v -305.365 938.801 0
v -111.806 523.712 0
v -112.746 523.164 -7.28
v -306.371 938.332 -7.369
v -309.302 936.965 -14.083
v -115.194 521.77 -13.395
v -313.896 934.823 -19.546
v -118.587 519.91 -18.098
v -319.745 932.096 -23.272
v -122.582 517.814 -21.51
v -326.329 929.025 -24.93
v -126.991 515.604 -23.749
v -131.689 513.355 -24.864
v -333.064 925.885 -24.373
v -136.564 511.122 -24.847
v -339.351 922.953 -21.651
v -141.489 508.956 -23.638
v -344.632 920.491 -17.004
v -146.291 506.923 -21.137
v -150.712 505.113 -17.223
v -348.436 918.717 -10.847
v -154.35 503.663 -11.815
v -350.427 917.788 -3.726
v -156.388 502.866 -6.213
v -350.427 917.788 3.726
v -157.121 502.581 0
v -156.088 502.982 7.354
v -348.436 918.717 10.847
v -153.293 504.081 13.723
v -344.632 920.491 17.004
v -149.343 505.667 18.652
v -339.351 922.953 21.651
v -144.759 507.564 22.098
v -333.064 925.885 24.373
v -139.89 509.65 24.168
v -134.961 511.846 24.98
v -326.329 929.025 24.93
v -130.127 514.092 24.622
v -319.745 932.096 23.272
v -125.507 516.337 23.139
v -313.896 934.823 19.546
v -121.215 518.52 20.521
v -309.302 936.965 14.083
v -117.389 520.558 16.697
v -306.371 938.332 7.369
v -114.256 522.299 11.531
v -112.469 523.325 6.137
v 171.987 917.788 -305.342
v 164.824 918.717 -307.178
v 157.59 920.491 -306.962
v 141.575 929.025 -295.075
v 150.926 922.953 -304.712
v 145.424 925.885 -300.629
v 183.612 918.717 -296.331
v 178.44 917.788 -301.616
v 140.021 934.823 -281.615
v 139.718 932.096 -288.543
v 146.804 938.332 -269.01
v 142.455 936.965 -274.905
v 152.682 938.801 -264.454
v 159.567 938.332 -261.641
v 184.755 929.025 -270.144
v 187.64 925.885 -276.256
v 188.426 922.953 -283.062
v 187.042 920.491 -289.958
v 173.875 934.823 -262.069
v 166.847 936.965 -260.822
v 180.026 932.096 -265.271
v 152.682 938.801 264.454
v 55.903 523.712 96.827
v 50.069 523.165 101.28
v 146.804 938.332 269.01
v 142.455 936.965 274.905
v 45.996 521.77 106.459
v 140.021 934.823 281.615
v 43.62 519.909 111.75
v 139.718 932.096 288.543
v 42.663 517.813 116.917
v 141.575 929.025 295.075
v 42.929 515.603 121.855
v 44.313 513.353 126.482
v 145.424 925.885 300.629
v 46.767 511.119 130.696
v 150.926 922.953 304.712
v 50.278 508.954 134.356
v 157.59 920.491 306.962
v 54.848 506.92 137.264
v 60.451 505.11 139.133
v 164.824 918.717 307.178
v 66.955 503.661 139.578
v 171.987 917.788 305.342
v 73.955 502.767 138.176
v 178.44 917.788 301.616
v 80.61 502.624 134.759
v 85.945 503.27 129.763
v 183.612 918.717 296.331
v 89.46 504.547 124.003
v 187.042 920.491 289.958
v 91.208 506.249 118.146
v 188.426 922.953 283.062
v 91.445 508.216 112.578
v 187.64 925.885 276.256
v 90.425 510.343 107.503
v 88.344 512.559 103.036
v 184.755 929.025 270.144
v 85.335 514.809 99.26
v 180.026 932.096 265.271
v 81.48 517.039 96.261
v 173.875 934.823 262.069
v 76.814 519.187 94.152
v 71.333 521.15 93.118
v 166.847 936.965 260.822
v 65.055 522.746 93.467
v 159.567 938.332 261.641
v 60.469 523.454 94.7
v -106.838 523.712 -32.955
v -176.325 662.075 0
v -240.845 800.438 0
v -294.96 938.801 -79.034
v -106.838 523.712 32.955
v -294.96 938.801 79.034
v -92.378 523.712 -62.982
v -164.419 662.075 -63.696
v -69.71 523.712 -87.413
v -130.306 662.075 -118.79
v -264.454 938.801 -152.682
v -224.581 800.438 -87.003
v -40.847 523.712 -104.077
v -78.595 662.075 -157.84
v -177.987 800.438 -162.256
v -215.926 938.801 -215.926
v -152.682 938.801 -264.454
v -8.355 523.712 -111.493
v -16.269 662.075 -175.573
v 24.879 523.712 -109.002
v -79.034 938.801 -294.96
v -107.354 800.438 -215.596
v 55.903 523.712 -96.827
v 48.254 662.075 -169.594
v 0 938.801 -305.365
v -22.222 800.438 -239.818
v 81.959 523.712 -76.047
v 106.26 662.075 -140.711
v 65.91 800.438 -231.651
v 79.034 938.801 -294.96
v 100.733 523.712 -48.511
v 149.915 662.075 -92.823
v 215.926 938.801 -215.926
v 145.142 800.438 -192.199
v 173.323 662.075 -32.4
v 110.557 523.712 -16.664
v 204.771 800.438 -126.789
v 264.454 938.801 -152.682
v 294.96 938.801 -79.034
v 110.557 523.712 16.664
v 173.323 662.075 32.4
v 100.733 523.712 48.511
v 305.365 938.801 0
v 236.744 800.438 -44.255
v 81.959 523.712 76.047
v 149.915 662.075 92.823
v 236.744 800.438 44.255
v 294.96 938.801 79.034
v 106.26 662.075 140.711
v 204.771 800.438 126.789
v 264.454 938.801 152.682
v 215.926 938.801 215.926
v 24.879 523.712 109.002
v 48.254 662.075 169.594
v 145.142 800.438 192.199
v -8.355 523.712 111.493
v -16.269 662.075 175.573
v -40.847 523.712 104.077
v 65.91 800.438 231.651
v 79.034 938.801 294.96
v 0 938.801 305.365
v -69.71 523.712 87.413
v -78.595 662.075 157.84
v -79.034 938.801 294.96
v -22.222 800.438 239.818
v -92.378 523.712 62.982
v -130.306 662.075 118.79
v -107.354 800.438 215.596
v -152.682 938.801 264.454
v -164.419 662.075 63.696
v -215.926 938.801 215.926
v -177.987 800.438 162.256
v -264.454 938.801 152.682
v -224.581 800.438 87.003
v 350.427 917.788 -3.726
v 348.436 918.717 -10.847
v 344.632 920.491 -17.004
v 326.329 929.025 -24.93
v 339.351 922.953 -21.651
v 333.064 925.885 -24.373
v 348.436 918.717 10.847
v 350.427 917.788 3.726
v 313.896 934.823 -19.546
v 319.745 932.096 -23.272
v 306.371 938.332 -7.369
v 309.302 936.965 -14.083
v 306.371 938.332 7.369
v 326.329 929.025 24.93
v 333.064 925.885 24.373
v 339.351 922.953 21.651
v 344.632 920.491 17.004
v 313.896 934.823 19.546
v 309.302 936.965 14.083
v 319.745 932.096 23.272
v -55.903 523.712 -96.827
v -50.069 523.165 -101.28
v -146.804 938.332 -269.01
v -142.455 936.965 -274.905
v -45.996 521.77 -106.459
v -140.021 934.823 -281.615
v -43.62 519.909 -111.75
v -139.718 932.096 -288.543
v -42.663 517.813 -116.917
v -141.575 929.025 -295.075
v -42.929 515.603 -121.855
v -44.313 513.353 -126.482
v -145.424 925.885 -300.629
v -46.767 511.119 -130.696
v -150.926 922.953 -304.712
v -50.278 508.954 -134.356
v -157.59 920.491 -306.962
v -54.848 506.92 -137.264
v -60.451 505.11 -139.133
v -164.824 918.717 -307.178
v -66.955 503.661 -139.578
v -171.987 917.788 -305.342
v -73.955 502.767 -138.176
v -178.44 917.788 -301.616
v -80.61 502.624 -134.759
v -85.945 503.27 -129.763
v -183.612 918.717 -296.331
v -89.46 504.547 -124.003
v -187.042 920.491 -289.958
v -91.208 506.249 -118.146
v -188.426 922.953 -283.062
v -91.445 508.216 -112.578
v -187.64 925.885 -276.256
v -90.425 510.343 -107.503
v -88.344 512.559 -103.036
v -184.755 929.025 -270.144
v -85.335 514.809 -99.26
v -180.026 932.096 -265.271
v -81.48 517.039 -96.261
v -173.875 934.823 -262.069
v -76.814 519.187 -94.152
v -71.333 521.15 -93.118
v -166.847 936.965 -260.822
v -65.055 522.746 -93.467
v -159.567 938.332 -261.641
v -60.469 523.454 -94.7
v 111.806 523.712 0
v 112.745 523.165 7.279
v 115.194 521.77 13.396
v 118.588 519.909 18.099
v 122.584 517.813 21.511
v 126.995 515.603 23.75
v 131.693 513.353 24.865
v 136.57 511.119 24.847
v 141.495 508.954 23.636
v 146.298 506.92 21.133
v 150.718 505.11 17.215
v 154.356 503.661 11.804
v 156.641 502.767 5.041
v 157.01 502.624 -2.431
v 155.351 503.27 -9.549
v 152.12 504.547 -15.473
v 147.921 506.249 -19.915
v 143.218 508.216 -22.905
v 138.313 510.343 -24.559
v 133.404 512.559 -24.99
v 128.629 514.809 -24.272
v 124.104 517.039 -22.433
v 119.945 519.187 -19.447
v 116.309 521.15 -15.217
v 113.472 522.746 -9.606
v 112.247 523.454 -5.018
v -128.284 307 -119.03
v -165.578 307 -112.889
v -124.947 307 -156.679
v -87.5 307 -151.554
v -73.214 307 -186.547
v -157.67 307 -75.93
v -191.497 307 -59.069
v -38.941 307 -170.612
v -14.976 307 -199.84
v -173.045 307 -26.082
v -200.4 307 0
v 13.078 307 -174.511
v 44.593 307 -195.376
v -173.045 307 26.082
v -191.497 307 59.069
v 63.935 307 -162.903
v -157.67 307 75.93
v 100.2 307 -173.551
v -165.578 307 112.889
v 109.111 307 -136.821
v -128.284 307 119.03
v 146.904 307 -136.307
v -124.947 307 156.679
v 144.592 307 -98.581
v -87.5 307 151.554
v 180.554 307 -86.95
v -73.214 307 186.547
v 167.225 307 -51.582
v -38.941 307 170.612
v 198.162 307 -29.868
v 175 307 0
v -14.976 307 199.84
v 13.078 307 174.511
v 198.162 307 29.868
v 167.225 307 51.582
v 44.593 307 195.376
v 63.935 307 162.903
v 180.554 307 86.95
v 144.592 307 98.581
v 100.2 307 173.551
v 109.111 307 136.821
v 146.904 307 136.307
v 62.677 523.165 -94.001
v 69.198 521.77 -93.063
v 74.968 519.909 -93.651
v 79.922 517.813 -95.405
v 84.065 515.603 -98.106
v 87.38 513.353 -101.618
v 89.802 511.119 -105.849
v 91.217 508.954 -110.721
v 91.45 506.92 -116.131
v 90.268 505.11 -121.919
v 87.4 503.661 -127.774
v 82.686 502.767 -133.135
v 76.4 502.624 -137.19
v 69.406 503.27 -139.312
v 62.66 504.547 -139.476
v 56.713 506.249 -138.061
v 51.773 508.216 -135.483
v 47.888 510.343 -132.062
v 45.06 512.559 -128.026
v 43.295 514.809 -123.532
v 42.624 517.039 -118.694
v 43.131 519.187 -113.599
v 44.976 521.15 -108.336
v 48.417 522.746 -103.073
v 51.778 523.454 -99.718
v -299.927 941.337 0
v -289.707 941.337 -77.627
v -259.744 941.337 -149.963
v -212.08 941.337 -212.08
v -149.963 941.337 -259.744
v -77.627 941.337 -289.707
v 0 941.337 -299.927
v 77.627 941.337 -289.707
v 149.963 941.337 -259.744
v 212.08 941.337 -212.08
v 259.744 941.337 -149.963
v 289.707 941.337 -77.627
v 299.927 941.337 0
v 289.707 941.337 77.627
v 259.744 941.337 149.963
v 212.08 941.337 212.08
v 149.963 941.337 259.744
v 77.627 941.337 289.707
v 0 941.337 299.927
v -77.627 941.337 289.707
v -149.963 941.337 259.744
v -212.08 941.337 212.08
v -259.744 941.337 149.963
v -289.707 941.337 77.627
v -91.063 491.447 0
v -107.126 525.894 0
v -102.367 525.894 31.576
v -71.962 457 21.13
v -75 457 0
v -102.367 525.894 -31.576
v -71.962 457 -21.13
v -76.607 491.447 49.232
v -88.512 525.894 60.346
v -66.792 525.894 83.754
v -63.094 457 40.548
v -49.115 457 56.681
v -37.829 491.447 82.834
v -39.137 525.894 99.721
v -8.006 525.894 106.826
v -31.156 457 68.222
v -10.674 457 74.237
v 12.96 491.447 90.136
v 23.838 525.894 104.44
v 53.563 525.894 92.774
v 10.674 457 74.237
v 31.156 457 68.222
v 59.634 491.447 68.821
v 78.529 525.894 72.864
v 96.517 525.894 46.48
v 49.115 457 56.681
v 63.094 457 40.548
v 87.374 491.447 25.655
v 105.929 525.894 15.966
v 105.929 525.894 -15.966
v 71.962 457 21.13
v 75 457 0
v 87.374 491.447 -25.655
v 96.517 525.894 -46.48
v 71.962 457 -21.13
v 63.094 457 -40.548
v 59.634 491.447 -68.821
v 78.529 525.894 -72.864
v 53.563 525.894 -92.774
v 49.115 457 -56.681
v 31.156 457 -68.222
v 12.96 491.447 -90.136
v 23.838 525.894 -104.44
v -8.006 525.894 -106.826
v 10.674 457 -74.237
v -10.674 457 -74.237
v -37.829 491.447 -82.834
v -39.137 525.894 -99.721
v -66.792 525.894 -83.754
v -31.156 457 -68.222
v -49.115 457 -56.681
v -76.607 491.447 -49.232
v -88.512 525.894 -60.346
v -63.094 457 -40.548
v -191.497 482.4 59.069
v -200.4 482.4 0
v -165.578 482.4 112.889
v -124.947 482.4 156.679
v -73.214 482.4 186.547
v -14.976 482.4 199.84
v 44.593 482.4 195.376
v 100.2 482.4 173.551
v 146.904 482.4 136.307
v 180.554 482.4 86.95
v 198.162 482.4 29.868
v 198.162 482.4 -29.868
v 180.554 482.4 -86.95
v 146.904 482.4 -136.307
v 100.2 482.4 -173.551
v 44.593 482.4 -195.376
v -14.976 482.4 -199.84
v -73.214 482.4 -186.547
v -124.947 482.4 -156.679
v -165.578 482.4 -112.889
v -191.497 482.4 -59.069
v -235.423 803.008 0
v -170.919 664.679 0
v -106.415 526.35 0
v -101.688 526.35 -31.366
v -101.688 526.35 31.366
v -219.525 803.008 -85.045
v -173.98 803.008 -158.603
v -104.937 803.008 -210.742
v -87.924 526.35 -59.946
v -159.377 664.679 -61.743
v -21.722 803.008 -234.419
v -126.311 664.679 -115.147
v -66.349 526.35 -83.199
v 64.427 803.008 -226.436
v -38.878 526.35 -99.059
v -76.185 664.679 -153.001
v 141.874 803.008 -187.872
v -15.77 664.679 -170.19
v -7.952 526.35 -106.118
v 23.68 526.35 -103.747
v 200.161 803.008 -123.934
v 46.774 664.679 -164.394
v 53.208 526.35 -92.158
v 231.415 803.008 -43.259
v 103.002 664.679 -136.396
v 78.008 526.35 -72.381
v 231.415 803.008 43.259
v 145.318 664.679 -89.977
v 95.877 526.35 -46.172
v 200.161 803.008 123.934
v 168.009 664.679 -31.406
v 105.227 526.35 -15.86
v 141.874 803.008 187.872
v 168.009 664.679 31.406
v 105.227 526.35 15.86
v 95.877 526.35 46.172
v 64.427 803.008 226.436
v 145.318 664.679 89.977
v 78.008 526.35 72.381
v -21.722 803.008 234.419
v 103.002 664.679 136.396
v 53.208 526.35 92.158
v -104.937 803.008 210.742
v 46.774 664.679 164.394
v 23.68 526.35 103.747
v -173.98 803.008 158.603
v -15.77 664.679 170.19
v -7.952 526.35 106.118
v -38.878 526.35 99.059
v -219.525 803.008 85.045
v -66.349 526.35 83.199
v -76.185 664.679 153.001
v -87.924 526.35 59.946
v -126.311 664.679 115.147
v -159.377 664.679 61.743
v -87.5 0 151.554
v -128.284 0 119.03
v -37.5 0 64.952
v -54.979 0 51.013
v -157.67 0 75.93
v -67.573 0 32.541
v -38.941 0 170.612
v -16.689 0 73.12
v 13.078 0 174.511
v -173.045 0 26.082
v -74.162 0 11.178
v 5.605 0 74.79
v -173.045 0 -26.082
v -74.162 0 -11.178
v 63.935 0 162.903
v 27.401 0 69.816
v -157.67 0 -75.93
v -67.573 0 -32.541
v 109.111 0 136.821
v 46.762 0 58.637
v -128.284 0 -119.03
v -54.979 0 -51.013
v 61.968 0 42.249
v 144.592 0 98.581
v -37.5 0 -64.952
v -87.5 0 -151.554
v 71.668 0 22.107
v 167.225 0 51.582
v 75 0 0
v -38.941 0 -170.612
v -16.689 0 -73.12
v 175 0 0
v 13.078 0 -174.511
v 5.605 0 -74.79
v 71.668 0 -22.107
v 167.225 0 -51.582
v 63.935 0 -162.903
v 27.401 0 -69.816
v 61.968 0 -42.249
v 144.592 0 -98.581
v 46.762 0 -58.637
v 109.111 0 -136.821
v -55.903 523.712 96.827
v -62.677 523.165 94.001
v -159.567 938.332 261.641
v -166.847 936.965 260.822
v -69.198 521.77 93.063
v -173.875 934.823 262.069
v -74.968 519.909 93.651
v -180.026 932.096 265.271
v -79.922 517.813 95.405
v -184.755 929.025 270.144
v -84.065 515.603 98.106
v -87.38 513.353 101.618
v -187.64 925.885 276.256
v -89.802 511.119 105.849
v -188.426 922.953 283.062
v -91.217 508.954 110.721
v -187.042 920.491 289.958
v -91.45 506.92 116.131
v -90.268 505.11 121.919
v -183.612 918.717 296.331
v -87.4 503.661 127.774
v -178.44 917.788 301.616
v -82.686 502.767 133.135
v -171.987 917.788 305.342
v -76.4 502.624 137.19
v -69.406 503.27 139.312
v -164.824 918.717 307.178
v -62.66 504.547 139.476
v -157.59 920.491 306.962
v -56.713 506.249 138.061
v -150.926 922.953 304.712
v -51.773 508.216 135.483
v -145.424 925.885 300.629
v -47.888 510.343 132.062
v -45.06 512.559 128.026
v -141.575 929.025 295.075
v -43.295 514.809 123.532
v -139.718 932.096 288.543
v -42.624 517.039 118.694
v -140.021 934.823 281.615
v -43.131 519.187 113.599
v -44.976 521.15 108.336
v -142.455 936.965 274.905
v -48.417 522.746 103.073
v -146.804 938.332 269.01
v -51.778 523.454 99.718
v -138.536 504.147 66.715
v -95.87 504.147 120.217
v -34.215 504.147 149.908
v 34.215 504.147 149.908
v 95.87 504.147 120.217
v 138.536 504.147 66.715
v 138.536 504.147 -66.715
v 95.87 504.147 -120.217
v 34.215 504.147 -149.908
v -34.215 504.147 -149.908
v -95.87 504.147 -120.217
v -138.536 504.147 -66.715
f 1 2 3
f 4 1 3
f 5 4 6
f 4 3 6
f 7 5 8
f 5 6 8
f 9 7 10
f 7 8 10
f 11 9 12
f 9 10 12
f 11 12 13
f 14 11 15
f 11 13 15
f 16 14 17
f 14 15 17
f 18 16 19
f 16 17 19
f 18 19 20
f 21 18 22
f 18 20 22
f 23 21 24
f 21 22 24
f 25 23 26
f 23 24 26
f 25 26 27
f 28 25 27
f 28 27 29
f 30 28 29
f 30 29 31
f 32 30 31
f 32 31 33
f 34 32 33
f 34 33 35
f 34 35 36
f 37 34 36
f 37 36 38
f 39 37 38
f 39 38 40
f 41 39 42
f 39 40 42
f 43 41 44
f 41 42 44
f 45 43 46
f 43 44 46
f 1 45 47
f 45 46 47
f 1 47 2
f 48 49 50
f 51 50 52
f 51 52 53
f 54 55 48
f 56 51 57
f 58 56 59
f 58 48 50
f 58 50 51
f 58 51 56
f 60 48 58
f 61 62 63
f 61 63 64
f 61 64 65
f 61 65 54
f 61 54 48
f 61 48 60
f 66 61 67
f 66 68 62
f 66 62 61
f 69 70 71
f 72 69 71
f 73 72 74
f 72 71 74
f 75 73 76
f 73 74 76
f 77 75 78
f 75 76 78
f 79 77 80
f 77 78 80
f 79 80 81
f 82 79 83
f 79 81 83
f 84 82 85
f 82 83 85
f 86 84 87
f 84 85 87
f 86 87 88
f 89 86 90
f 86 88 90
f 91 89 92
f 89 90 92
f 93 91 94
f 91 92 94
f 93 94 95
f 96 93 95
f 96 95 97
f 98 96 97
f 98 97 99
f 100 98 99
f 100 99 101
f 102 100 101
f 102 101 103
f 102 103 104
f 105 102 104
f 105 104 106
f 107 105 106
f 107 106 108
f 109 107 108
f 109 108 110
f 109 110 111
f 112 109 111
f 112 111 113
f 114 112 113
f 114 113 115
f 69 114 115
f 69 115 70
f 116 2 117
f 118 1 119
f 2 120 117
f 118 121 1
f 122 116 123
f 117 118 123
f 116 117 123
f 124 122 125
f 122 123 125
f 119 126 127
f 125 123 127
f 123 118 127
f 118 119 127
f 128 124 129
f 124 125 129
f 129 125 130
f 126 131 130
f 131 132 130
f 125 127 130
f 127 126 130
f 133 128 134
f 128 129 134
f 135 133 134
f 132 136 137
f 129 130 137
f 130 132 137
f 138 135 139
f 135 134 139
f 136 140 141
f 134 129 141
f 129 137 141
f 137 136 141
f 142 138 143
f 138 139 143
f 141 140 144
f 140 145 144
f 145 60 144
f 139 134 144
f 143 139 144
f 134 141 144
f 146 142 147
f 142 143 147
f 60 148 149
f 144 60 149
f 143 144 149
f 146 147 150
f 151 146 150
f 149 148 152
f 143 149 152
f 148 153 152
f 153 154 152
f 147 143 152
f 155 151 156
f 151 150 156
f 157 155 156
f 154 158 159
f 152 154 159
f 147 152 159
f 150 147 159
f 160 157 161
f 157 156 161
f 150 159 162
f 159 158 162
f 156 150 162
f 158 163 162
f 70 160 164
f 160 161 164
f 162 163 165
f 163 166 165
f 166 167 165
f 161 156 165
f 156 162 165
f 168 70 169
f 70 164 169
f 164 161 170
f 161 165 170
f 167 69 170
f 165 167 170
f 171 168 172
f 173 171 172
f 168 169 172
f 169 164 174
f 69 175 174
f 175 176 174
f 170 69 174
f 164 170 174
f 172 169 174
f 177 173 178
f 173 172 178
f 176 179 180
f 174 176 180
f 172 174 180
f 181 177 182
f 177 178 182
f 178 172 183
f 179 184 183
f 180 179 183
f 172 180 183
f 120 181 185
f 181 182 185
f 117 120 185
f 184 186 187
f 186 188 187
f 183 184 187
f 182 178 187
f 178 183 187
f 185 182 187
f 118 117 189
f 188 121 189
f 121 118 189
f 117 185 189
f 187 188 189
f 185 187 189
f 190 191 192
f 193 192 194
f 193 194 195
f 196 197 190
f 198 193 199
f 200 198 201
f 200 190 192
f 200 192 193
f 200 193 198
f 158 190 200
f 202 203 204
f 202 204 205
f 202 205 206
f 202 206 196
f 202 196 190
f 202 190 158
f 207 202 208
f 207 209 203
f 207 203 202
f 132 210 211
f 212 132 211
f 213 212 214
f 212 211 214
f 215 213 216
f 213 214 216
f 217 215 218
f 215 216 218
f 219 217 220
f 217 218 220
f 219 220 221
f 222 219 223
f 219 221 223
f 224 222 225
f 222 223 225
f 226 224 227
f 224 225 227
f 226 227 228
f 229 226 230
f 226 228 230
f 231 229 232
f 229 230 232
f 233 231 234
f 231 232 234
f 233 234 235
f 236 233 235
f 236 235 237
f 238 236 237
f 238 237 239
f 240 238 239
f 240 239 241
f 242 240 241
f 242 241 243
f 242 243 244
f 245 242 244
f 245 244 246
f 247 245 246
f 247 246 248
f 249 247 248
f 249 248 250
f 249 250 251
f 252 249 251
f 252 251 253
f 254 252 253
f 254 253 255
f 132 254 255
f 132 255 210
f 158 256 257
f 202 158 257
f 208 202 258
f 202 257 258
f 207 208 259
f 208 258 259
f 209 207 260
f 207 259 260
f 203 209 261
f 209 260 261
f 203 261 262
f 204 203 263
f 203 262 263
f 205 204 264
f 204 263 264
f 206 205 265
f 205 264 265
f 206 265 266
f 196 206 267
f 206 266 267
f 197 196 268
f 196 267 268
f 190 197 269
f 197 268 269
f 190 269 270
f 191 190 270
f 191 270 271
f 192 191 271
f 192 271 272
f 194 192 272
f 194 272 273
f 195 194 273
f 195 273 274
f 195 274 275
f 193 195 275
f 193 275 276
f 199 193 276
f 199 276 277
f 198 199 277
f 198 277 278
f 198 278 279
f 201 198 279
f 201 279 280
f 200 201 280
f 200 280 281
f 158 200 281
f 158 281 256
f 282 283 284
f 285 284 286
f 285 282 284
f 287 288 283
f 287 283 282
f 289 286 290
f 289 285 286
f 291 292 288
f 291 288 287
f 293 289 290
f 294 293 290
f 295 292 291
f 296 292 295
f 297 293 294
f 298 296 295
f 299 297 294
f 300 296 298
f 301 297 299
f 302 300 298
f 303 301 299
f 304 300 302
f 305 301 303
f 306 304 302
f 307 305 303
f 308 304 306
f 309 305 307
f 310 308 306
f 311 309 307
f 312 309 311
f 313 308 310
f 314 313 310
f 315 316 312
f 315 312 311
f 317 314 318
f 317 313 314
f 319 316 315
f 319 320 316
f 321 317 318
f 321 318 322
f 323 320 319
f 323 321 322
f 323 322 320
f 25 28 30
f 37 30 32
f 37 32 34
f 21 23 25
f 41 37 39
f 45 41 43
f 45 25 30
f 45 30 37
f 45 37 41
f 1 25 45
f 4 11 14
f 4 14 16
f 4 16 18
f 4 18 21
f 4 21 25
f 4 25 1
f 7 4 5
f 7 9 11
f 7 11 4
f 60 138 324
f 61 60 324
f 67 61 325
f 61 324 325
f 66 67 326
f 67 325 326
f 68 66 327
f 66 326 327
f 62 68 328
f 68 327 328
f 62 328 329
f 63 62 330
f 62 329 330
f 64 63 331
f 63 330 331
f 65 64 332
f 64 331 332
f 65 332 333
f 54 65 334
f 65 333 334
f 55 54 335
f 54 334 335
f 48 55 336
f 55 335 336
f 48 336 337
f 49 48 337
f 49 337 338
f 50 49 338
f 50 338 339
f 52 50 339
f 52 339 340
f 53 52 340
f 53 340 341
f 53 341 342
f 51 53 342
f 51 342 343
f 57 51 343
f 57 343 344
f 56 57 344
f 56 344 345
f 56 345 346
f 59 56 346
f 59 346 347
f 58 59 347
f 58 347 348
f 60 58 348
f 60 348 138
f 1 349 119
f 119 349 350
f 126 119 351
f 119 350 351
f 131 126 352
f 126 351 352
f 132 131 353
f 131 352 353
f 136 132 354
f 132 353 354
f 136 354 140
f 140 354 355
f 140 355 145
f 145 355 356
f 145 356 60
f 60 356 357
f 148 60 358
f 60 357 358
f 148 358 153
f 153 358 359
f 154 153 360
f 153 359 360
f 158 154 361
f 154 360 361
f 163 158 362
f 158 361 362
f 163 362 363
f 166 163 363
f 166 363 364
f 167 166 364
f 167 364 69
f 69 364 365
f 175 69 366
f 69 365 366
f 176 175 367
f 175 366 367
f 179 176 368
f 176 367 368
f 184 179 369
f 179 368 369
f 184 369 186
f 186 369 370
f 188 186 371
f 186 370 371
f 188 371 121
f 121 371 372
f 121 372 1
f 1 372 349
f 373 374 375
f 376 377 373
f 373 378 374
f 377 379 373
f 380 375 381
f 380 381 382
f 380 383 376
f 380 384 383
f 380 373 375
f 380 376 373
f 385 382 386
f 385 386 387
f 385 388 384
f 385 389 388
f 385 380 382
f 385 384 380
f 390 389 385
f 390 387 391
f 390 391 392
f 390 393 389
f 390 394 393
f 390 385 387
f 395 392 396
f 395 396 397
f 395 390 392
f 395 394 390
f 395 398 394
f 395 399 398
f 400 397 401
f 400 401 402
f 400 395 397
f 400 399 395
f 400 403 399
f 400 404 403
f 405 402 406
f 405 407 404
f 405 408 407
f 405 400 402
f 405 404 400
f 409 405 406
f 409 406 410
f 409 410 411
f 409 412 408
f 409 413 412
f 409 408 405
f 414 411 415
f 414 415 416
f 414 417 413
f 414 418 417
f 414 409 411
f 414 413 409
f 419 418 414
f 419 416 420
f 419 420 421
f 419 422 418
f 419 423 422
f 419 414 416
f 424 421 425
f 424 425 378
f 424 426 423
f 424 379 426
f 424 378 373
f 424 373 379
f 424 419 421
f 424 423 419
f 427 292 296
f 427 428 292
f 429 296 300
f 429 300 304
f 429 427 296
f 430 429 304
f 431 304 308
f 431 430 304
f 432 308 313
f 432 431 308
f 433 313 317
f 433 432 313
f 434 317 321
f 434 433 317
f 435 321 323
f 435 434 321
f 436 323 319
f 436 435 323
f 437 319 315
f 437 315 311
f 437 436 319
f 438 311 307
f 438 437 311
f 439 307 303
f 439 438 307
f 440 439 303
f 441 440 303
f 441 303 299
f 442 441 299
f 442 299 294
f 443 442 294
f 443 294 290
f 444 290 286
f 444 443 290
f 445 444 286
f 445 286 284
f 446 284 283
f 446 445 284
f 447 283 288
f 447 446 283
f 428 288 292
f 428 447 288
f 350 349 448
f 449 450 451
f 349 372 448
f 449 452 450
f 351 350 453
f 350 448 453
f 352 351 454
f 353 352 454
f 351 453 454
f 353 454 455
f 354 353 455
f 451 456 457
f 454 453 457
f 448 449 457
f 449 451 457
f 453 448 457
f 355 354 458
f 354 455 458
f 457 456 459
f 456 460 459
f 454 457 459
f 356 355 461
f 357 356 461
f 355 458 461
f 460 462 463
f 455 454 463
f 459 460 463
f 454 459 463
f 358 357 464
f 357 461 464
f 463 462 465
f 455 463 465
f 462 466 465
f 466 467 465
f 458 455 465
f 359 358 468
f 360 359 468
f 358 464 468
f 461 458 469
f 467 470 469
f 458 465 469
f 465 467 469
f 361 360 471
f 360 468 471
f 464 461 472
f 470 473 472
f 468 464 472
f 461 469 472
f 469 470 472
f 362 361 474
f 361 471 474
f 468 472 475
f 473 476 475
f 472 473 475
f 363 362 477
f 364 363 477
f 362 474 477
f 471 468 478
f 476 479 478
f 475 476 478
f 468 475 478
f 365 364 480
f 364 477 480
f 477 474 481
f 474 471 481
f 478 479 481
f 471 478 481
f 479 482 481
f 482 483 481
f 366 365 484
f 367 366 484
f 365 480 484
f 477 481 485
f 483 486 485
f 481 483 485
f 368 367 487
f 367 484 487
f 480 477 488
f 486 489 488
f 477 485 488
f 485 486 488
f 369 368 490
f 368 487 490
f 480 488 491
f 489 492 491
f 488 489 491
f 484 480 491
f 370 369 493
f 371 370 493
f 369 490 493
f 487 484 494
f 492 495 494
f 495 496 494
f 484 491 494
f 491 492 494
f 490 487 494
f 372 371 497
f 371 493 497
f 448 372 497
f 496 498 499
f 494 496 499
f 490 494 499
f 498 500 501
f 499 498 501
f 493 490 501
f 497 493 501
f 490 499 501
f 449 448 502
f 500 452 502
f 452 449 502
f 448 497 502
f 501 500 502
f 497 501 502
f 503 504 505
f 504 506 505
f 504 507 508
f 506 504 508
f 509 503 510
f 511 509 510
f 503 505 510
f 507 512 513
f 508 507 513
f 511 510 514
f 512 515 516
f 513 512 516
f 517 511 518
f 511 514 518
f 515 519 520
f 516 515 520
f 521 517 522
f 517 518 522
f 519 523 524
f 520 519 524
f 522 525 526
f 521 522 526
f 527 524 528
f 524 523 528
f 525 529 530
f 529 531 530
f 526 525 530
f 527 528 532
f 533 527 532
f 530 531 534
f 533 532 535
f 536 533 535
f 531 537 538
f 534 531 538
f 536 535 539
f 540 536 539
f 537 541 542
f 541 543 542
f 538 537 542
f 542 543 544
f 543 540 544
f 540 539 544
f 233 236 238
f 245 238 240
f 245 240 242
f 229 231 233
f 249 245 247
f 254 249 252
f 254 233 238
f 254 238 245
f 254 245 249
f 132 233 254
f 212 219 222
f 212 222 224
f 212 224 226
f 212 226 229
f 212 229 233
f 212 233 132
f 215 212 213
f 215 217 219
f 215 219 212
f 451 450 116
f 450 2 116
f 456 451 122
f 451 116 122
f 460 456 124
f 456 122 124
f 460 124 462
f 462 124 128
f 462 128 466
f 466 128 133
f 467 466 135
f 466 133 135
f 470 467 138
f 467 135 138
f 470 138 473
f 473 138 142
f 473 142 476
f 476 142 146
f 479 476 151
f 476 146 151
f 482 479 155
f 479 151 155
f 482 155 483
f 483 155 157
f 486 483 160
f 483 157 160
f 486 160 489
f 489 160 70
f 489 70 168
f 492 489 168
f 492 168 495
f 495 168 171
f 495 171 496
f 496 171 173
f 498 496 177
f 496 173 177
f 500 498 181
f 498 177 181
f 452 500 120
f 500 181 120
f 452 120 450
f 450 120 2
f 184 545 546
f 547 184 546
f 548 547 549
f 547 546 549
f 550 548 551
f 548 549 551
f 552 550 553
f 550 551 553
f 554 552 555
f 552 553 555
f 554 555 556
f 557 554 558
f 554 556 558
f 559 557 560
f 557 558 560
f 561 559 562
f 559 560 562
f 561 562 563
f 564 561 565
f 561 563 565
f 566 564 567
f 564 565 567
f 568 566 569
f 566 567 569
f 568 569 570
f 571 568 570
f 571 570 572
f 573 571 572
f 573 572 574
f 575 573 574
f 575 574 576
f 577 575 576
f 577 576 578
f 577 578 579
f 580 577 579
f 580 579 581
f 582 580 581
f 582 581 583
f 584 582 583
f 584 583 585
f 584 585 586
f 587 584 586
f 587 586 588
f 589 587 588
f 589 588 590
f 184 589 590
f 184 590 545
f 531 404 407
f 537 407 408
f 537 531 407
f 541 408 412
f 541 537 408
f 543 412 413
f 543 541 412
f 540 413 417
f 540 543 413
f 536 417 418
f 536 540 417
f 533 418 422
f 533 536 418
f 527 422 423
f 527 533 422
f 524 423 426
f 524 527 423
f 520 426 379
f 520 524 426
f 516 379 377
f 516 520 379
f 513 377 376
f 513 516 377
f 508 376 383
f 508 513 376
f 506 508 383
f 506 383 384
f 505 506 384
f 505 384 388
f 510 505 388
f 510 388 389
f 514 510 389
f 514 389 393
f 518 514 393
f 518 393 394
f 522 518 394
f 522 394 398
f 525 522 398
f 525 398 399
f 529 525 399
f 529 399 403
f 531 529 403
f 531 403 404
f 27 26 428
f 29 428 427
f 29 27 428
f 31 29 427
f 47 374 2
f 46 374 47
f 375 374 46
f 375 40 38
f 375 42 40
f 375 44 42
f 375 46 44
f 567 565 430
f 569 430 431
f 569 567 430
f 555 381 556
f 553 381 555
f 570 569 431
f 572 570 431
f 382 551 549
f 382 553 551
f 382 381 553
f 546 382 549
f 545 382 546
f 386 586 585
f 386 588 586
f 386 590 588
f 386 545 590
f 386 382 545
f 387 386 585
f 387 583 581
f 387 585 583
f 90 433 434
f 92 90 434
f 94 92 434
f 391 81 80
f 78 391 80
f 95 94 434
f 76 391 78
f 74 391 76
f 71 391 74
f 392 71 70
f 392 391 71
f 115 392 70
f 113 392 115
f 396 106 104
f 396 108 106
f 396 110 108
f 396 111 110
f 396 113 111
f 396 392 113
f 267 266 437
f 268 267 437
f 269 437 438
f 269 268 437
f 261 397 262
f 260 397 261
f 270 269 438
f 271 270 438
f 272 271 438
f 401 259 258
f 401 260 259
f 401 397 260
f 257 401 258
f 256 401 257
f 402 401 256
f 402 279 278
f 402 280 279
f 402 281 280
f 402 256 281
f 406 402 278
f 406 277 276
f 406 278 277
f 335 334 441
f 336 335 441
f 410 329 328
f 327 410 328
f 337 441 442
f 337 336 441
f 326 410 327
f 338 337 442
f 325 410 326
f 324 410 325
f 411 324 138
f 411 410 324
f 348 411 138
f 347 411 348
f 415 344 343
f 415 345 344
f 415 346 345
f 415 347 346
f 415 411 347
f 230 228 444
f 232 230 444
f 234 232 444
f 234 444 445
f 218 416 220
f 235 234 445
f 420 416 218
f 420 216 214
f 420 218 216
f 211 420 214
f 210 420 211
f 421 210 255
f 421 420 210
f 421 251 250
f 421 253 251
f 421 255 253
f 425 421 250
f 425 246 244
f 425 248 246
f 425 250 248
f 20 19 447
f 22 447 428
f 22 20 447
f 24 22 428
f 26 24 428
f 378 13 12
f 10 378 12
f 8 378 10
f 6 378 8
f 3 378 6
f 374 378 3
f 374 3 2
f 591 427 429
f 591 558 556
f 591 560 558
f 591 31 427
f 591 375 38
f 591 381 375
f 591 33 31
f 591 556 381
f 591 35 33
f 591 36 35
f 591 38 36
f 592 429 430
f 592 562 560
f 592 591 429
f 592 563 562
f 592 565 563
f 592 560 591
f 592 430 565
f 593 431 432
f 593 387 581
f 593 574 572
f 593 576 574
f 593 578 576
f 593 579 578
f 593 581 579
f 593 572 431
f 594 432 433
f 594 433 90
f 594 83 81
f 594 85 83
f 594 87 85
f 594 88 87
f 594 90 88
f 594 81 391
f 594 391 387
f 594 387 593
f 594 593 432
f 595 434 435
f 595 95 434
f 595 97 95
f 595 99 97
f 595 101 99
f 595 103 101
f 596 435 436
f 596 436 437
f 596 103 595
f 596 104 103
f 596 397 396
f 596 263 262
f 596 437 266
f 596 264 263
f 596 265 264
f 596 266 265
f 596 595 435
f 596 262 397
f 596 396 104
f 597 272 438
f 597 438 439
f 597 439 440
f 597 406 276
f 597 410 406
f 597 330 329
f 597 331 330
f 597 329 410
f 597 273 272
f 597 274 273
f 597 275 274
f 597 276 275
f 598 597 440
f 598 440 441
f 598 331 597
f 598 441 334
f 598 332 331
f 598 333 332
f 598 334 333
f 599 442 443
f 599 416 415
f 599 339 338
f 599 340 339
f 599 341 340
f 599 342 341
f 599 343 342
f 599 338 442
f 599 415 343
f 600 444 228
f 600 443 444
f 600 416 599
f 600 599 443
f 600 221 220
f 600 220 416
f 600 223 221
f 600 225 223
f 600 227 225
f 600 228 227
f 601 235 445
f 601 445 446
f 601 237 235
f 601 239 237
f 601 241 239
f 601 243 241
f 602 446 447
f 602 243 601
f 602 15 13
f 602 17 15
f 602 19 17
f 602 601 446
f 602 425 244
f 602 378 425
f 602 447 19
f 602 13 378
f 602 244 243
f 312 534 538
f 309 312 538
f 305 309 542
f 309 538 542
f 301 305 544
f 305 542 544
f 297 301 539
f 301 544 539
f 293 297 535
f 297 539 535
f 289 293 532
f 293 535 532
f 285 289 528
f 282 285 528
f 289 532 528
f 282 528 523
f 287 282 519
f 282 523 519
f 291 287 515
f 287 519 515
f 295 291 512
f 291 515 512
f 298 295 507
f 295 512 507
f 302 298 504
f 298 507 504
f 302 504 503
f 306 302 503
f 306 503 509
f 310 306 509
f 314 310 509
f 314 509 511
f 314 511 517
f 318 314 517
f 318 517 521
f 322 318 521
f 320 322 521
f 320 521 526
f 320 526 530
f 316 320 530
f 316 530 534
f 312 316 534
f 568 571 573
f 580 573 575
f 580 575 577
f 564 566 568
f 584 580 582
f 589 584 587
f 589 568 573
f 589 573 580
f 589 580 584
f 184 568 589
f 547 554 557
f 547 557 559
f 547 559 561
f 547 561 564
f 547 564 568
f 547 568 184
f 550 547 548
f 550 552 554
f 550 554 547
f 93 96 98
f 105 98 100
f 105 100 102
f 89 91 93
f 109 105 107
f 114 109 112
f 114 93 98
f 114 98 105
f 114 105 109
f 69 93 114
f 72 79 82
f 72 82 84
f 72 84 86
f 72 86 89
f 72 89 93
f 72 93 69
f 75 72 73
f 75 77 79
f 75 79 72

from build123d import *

# Parameters (mm, degrees)
SKETCH1_R           = 175
SKETCH1_R_2         = 75
BOSS_EXTRUDE1_DEPTH = 457
SKETCH3_R           = 25
CUT_EXTRUDE1_DEPTH  = 50
CIRPATTERN1_COUNT   = 6
SKETCH4_R           = 25
BOSS_EXTRUDE2_DEPTH = 508
CIRPATTERN2_COUNT   = 6


with BuildPart() as part:
    # Sketch1 → Boss-Extrude1 (new body)
    with BuildSketch(Plane(origin=(0, 0, 0), x_dir=(1, 0, 0), z_dir=(0, 1, 0))):
        Circle(SKETCH1_R)
        Circle(SKETCH1_R_2, mode=Mode.SUBTRACT)
    extrude(amount=BOSS_EXTRUDE1_DEPTH)

    # Sketch2 → Revolve1 (revolve)
    with BuildSketch(Plane.XY):
        Polygon((-175, 307), (-200.4, 307), (-200.4, 482.4), (-107.12583228, 525.894458716), (-75, 457), (-175, 457), align=None)
    revolve(axis=Axis((0, 0, 0), (0, 1, 0)))

    # Sketch3 → Cut-Extrude1 (cut)
    with BuildSketch(Plane(origin=(220.56260119, 472.998024657, 0), x_dir=(0.906307787, -0.422618262, 0), z_dir=(0.422618262, 0.906307787, 0))):
        with Locations((-95, 0)):
            Circle(SKETCH3_R)
    cut_extrude1 = extrude(amount=-CUT_EXTRUDE1_DEPTH, mode=Mode.SUBTRACT)

    # CirPattern1: Cut-Extrude1 ×6 about axis
    cirpattern1_axis = Axis((0, 0, 0), (0, 1, 0))
    for i in range(1, CIRPATTERN1_COUNT):
        add(cut_extrude1.rotate(cirpattern1_axis, i * 360 / CIRPATTERN1_COUNT), mode=Mode.SUBTRACT)

    # Sketch4 → Boss-Extrude2 (add)
    with BuildSketch(Plane(origin=(-199.431688103, 427.682635305, 0), x_dir=(0.906307787, 0.422618262, 0), z_dir=(-0.422618262, 0.906307787, 0))):
        with Locations((95, 0)):
            Circle(SKETCH4_R)
    boss_extrude2 = extrude(amount=BOSS_EXTRUDE2_DEPTH)

    # CirPattern2: Boss-Extrude2 ×6 about axis
    cirpattern2_axis = Axis((0, 0, 0), (0, 1, 0))
    for i in range(1, CIRPATTERN2_COUNT):
        add(boss_extrude2.rotate(cirpattern2_axis, i * 360 / CIRPATTERN2_COUNT))


with BuildPart() as body_2:
    # Sketch7 → Revolve2 (revolve)
    with BuildSketch(Plane.XY):
        Polygon((-111.805666745, 523.712216066), (-305.364830623, 938.801182529), (-299.9269839, 941.336892099), (-106.415237078, 526.349611839), align=None)
    revolve(axis=Axis((0, 457, 0), (0, -1, 0)))


solid = Compound([part.part, body_2.part])
